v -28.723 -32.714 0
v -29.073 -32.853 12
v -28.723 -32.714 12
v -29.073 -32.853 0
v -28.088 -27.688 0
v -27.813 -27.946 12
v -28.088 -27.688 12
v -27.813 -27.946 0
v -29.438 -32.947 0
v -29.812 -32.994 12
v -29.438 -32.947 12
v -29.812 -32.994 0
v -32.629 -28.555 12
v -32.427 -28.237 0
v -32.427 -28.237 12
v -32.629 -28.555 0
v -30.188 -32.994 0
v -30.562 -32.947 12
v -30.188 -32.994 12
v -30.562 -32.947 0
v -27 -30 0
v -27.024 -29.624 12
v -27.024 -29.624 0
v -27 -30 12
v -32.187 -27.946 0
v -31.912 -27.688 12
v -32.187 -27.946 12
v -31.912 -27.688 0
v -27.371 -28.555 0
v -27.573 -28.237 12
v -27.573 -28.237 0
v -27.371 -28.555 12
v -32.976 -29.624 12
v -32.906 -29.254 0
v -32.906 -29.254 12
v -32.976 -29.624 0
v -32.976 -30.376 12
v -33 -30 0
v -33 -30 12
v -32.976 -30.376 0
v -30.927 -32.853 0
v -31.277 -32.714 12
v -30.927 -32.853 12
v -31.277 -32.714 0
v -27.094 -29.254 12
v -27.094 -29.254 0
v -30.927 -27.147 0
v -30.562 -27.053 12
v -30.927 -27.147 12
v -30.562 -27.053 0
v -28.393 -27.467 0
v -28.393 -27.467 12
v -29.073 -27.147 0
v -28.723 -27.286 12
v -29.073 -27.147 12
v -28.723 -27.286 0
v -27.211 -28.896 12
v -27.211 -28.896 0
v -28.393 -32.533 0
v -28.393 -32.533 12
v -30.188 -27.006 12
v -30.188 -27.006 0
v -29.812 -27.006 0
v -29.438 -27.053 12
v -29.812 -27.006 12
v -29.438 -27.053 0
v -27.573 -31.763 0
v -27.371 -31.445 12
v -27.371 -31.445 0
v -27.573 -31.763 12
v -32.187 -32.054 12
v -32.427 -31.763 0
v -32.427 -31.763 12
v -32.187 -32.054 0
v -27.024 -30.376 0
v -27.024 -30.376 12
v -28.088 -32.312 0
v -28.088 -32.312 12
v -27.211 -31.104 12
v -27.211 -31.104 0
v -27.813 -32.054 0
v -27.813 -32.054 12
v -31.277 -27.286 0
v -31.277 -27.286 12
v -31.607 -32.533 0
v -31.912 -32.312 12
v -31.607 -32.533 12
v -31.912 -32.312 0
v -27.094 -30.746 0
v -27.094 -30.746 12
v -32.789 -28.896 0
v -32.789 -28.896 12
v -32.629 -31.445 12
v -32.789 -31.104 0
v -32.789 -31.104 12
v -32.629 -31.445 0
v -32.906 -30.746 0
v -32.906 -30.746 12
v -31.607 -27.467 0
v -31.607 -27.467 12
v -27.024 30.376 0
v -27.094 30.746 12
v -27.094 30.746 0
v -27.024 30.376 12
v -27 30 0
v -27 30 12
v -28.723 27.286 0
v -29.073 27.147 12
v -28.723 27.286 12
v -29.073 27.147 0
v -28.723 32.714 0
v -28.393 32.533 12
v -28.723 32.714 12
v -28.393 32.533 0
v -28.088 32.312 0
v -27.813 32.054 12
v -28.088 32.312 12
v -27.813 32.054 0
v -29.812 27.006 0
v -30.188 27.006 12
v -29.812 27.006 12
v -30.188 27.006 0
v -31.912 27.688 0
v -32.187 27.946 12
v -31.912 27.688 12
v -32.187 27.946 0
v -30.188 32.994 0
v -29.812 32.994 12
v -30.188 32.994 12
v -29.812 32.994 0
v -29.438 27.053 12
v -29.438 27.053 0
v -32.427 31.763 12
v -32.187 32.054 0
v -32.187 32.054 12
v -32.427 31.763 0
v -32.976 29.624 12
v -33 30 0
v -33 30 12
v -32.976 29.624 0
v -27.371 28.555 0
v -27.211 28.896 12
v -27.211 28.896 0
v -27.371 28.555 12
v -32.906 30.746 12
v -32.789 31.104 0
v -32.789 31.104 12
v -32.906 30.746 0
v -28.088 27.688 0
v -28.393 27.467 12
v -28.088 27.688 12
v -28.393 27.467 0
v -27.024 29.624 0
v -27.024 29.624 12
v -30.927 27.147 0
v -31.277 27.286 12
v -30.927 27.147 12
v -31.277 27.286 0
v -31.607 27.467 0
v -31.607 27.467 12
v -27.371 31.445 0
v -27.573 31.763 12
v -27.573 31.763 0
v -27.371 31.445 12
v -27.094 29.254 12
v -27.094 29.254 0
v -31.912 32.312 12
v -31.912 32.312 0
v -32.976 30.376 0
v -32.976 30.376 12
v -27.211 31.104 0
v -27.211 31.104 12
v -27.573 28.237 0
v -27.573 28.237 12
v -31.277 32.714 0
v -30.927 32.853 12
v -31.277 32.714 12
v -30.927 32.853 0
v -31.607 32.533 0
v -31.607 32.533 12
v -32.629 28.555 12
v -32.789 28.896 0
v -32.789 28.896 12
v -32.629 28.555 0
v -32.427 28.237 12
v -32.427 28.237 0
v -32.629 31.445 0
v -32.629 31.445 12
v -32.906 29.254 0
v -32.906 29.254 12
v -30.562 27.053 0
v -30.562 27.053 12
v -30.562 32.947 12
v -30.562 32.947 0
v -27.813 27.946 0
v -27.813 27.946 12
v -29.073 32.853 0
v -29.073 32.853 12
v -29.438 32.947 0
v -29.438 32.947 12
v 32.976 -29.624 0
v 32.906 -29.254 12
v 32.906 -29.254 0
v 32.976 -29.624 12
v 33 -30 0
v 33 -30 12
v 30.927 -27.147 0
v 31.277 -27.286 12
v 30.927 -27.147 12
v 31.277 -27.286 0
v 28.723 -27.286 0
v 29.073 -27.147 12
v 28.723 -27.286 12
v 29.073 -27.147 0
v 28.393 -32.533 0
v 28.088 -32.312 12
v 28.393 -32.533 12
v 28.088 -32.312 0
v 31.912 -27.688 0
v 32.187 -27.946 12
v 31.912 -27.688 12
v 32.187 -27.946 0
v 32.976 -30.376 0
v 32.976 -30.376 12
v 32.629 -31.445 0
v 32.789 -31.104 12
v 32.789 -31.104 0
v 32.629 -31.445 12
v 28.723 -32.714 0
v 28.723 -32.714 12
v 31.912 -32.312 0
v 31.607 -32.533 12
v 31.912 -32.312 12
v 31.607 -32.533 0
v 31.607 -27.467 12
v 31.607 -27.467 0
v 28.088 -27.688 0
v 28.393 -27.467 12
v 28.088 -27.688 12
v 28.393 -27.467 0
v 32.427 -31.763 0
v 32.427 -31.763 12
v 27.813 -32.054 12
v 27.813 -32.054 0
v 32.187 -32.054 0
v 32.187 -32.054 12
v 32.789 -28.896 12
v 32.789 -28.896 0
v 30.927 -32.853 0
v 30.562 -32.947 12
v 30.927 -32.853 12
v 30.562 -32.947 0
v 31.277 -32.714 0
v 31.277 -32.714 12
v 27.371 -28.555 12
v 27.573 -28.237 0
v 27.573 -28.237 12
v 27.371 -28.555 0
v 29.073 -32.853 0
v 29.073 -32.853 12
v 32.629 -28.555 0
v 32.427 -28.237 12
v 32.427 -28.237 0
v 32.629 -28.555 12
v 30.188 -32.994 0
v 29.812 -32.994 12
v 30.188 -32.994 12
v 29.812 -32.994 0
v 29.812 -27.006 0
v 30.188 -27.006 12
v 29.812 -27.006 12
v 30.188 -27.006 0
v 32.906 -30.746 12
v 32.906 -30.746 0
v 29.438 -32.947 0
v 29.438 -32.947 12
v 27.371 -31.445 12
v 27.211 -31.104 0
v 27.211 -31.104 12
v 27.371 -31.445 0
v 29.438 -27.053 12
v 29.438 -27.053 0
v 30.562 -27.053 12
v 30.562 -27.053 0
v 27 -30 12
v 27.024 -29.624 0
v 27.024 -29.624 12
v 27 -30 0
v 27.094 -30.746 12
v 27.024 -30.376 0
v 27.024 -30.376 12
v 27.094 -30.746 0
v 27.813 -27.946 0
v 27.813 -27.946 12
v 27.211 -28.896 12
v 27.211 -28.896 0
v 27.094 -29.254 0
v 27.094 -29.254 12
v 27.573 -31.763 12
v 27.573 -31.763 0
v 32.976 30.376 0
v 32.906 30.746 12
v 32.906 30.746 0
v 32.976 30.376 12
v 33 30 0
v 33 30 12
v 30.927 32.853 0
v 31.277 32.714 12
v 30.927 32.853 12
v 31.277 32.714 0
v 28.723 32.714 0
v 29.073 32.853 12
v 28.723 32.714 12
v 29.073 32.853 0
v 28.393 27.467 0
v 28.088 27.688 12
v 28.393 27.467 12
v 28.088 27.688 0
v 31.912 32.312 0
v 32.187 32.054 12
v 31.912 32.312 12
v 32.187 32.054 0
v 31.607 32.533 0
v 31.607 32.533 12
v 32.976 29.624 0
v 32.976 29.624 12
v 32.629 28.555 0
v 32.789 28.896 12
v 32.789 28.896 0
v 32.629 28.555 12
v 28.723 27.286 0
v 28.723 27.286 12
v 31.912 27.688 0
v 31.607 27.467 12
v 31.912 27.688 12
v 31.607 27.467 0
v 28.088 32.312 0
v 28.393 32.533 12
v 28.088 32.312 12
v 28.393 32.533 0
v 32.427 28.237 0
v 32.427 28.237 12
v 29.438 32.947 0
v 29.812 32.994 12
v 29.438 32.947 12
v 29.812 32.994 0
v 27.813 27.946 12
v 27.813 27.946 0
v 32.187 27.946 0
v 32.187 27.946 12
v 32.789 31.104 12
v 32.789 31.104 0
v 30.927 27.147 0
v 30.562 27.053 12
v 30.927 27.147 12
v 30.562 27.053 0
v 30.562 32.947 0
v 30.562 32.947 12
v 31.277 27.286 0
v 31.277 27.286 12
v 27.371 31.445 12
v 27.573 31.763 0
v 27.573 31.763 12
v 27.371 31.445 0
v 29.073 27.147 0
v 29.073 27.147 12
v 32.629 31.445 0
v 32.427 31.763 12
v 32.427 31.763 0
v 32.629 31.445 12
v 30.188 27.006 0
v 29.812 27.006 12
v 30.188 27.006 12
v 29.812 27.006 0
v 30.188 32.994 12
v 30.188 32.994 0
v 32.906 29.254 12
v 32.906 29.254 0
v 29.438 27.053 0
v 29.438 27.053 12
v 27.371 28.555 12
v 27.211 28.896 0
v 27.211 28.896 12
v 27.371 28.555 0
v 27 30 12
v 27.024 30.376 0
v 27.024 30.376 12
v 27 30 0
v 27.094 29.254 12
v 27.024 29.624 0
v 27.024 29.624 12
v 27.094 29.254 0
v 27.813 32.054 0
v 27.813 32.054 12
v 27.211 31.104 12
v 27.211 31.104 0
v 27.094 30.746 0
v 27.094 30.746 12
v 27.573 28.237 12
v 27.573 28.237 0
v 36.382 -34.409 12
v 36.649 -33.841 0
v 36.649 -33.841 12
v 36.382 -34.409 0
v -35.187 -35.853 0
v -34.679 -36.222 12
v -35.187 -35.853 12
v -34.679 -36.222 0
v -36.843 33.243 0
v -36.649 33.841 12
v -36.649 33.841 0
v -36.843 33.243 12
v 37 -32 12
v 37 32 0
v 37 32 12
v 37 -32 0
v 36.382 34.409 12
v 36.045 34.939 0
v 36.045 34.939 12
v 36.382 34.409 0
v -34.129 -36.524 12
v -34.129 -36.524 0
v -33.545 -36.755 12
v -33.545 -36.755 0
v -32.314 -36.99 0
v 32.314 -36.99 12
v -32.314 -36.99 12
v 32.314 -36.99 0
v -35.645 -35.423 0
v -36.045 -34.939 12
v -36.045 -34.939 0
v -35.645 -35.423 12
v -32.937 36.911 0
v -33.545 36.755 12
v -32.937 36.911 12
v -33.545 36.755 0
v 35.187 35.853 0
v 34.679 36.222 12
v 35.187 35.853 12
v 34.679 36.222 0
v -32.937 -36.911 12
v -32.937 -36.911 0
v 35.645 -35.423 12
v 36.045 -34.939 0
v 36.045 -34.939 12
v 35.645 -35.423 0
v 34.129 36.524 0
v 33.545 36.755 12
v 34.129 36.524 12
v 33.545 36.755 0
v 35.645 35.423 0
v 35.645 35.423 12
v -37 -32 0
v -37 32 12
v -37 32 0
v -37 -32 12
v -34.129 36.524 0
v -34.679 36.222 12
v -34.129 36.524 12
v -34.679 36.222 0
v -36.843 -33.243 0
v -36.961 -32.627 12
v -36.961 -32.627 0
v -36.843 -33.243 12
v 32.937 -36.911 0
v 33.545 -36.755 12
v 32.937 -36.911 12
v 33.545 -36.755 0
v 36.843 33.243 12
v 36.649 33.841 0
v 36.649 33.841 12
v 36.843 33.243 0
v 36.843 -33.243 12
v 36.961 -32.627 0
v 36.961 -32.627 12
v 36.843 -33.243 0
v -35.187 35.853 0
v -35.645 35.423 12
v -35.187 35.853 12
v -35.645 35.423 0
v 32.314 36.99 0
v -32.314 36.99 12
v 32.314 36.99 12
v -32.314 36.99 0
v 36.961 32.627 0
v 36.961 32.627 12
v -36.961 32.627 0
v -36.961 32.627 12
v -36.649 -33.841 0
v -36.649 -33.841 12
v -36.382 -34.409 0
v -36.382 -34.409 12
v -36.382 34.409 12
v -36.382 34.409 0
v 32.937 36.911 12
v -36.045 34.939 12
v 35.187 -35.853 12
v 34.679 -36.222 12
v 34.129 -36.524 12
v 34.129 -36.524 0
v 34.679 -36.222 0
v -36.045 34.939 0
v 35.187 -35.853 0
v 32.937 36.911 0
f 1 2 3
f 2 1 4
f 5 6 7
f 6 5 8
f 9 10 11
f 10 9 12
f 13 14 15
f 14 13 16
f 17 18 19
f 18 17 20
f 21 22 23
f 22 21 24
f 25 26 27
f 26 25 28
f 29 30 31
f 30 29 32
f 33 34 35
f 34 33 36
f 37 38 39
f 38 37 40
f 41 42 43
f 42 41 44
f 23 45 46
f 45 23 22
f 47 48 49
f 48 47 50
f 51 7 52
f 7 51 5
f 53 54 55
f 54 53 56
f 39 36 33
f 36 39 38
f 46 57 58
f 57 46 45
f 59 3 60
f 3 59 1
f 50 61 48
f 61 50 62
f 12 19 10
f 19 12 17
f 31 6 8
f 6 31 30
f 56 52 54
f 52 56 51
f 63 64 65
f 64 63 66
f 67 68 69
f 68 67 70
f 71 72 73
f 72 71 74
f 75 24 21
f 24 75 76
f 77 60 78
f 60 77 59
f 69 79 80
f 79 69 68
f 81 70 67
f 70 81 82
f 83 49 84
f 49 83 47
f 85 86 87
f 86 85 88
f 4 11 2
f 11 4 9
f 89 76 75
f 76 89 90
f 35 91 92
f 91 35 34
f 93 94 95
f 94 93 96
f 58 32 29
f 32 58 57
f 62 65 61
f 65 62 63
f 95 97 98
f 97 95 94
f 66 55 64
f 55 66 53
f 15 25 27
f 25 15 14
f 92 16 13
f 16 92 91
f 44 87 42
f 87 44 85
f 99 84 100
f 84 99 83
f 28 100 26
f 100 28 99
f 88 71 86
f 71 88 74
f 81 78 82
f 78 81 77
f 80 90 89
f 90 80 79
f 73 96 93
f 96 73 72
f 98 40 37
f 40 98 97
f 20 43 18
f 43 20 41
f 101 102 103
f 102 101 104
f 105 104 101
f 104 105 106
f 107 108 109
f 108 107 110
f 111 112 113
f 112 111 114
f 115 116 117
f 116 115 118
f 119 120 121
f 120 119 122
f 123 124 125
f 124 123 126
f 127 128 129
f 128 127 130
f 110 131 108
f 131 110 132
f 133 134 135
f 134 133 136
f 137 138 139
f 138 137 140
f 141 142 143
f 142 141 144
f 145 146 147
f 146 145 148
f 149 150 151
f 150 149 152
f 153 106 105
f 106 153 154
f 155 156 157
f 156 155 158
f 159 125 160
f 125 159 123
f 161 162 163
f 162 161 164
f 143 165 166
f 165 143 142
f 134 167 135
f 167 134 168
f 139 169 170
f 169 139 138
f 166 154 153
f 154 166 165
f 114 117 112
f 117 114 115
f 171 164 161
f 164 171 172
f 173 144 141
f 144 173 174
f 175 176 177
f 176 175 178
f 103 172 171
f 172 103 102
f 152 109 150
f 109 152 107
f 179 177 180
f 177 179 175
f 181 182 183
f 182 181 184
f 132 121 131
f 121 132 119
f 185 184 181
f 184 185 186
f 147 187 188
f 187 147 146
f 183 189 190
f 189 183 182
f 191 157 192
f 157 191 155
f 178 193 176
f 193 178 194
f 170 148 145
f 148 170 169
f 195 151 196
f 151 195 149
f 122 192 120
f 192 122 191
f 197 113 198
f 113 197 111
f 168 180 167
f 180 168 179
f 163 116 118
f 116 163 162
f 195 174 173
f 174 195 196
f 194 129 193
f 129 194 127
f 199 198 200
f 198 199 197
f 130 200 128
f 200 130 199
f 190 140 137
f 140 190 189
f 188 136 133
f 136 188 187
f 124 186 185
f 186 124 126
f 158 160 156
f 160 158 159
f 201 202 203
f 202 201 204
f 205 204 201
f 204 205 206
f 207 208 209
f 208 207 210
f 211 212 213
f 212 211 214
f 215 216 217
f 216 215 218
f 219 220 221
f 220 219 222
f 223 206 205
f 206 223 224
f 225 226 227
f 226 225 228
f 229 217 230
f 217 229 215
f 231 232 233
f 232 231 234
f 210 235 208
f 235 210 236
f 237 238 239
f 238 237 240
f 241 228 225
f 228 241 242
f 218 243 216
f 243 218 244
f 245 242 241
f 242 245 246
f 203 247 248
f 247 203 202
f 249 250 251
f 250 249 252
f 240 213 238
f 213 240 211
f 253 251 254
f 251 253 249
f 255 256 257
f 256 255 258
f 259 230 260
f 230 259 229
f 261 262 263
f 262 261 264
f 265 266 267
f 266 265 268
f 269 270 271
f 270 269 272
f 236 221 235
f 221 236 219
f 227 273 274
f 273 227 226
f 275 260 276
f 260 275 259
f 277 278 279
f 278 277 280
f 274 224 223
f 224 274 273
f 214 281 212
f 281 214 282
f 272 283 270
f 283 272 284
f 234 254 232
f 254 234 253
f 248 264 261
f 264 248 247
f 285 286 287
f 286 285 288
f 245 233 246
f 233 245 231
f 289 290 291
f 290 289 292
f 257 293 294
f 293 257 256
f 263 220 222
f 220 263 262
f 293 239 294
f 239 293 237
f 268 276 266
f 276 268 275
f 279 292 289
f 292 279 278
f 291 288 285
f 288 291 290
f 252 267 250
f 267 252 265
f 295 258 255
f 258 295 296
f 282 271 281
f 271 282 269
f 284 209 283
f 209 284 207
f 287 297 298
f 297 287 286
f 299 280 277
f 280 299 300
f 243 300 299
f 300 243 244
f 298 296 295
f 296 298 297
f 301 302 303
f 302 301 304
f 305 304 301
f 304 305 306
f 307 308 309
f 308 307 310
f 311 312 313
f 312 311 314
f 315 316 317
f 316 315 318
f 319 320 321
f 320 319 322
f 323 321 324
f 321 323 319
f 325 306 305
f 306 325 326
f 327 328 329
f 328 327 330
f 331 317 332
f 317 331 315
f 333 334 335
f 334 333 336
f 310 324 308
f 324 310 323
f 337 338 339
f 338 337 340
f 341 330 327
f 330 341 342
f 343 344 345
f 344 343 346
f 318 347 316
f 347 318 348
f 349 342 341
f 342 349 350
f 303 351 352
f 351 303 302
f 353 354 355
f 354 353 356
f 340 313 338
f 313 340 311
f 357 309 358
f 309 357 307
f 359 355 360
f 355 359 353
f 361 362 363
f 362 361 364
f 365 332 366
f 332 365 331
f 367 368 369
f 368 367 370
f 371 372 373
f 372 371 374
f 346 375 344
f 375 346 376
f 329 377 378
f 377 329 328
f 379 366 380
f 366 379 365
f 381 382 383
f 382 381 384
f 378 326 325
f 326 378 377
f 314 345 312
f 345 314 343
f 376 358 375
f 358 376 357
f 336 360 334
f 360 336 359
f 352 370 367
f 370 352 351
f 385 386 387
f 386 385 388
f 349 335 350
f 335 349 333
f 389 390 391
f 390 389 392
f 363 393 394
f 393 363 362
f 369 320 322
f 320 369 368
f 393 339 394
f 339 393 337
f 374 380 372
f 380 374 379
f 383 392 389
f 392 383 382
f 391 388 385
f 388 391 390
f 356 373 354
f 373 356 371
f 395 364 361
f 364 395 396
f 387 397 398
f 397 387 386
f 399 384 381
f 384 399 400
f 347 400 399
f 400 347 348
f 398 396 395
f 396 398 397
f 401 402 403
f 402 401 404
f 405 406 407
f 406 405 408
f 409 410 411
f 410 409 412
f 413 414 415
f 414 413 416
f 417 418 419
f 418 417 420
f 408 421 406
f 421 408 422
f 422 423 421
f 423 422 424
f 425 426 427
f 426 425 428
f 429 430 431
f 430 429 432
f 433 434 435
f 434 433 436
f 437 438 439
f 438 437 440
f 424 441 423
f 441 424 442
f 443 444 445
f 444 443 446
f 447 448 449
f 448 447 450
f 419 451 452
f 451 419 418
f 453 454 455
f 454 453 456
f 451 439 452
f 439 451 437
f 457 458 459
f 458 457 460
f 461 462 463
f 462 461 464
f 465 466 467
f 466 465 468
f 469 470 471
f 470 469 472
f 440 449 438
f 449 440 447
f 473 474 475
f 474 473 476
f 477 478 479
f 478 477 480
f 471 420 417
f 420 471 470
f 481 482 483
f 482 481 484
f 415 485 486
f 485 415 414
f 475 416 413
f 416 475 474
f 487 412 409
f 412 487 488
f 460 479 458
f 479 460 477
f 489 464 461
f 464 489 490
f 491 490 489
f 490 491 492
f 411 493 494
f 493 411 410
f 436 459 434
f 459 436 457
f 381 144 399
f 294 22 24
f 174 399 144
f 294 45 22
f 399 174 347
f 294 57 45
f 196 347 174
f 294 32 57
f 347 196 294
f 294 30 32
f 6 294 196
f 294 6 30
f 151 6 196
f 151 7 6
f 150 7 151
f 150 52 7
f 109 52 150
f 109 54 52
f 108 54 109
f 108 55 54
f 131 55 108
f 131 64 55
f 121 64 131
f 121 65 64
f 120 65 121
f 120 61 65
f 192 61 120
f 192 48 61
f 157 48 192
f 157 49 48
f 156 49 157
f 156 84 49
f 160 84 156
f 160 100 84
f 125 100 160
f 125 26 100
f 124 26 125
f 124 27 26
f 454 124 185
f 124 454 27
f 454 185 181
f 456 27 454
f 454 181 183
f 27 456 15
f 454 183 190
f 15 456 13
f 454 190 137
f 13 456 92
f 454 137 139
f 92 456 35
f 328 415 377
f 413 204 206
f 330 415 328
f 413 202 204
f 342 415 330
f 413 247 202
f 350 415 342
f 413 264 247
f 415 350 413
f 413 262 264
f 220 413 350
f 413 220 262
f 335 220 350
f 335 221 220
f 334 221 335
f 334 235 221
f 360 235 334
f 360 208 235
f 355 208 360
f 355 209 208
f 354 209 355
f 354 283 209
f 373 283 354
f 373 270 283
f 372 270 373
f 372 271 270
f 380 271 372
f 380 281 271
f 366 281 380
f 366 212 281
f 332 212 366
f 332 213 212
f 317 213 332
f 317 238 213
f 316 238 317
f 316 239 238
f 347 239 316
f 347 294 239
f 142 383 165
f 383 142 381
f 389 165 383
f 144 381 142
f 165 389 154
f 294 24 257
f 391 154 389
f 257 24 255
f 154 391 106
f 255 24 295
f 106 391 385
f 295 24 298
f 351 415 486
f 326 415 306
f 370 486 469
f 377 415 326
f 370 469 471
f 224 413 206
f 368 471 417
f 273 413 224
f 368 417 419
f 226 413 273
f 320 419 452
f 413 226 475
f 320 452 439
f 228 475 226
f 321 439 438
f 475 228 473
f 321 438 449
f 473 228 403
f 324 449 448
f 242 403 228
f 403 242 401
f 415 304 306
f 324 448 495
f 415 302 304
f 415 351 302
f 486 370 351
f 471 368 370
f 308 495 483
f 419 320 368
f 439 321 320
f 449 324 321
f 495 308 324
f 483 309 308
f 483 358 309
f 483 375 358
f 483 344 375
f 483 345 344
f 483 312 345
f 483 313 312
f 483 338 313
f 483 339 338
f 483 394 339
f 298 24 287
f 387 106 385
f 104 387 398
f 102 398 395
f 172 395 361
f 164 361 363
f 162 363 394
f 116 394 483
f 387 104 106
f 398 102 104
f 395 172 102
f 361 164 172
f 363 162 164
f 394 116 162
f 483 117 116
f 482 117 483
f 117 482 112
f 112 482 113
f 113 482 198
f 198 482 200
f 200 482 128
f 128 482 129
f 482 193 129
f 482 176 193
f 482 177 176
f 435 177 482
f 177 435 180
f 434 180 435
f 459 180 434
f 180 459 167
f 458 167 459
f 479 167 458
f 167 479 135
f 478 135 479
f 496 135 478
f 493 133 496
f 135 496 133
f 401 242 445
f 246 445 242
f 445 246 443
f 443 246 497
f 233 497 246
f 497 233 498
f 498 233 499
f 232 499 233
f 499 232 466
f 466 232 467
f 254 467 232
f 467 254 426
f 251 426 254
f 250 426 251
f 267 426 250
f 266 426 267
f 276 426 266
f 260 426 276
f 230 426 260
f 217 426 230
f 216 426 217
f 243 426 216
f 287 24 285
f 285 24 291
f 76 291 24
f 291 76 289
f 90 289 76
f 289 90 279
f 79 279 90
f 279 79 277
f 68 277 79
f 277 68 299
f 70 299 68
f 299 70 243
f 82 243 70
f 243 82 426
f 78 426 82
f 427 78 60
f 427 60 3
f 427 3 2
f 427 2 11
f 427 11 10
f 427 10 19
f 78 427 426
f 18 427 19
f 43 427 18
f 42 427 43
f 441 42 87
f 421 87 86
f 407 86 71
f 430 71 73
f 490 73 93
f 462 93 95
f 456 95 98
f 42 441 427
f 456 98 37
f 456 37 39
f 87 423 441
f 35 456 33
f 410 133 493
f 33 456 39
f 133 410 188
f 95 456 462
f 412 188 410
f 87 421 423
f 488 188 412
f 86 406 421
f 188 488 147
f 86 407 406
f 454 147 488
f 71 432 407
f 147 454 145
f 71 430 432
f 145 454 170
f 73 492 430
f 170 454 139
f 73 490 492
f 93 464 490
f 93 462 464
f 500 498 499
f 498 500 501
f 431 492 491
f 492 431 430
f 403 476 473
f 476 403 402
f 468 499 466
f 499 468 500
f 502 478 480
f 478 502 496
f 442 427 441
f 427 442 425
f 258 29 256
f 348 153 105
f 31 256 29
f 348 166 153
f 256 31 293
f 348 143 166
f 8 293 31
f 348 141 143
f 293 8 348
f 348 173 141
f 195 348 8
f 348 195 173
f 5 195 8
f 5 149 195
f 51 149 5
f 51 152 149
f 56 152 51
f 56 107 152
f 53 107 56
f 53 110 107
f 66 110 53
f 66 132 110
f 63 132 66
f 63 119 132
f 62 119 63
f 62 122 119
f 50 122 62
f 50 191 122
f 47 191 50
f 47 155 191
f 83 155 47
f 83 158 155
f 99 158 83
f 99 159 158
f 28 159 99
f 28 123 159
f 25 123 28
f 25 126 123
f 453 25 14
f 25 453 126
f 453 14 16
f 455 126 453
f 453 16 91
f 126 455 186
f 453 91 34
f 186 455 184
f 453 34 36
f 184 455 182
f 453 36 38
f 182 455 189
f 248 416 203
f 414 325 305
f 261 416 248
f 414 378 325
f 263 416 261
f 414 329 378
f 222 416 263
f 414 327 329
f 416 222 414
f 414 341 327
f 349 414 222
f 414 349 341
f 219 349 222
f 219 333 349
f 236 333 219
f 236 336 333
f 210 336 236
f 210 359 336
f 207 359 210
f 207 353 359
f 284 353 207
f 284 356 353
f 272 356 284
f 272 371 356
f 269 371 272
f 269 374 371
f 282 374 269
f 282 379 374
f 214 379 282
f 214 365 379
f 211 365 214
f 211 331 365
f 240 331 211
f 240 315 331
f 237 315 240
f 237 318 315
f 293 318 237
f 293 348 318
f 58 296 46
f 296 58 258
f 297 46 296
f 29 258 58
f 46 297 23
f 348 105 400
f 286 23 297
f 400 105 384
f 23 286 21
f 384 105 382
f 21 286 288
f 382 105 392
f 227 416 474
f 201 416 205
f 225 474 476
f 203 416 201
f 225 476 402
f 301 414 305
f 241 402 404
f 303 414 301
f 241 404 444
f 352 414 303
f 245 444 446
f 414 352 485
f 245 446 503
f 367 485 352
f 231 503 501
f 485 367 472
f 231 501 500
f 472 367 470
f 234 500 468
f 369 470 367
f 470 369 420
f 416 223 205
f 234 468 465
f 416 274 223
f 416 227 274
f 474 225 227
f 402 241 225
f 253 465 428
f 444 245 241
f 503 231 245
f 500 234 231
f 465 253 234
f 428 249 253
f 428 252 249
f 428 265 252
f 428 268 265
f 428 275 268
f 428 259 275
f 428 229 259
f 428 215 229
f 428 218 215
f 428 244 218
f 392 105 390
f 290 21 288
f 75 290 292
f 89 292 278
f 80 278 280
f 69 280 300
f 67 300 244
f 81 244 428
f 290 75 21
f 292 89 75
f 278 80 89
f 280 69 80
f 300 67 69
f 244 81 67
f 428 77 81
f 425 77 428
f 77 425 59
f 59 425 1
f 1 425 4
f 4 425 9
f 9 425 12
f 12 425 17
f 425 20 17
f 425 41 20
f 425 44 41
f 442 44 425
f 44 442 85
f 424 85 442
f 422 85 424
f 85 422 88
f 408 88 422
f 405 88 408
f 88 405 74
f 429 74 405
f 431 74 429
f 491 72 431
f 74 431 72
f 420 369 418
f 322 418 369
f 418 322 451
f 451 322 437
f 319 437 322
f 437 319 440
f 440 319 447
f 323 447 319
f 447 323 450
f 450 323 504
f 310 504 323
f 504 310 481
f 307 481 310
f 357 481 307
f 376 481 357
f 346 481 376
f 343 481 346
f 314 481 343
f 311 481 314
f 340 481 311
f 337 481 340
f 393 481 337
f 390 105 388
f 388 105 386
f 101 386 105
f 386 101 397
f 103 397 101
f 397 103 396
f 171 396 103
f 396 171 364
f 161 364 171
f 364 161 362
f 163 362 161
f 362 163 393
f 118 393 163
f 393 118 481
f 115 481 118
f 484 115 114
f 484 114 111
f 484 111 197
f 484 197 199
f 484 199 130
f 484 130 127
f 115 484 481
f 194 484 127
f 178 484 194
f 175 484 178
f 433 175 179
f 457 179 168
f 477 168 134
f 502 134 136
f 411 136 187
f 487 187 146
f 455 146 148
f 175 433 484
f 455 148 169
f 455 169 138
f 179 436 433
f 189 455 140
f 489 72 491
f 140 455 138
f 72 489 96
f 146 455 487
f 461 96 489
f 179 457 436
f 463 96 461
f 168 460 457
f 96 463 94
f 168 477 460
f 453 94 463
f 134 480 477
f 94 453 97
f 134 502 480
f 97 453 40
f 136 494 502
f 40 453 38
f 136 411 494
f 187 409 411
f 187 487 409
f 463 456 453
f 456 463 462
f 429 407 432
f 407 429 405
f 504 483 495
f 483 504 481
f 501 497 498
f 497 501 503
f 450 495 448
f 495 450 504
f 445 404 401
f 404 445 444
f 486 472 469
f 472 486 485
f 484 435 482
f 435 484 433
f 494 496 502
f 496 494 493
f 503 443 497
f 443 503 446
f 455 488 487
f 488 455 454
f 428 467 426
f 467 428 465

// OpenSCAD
$fn = 50;


difference() {
	union() {
		hull() {
			translate(v = [-32.0000000000, 32.0000000000, 0]) {
				cylinder(h = 12, r = 5);
			}
			translate(v = [32.0000000000, 32.0000000000, 0]) {
				cylinder(h = 12, r = 5);
			}
			translate(v = [-32.0000000000, -32.0000000000, 0]) {
				cylinder(h = 12, r = 5);
			}
			translate(v = [32.0000000000, -32.0000000000, 0]) {
				cylinder(h = 12, r = 5);
			}
		}
	}
	union() {
		translate(v = [-30.0000000000, -30.0000000000, -100.0000000000]) {
			cylinder(h = 200, r = 3.0000000000);
		}
		translate(v = [-30.0000000000, 30.0000000000, -100.0000000000]) {
			cylinder(h = 200, r = 3.0000000000);
		}
		translate(v = [30.0000000000, -30.0000000000, -100.0000000000]) {
			cylinder(h = 200, r = 3.0000000000);
		}
		translate(v = [30.0000000000, 30.0000000000, -100.0000000000]) {
			cylinder(h = 200, r = 3.0000000000);
		}
	}
}
